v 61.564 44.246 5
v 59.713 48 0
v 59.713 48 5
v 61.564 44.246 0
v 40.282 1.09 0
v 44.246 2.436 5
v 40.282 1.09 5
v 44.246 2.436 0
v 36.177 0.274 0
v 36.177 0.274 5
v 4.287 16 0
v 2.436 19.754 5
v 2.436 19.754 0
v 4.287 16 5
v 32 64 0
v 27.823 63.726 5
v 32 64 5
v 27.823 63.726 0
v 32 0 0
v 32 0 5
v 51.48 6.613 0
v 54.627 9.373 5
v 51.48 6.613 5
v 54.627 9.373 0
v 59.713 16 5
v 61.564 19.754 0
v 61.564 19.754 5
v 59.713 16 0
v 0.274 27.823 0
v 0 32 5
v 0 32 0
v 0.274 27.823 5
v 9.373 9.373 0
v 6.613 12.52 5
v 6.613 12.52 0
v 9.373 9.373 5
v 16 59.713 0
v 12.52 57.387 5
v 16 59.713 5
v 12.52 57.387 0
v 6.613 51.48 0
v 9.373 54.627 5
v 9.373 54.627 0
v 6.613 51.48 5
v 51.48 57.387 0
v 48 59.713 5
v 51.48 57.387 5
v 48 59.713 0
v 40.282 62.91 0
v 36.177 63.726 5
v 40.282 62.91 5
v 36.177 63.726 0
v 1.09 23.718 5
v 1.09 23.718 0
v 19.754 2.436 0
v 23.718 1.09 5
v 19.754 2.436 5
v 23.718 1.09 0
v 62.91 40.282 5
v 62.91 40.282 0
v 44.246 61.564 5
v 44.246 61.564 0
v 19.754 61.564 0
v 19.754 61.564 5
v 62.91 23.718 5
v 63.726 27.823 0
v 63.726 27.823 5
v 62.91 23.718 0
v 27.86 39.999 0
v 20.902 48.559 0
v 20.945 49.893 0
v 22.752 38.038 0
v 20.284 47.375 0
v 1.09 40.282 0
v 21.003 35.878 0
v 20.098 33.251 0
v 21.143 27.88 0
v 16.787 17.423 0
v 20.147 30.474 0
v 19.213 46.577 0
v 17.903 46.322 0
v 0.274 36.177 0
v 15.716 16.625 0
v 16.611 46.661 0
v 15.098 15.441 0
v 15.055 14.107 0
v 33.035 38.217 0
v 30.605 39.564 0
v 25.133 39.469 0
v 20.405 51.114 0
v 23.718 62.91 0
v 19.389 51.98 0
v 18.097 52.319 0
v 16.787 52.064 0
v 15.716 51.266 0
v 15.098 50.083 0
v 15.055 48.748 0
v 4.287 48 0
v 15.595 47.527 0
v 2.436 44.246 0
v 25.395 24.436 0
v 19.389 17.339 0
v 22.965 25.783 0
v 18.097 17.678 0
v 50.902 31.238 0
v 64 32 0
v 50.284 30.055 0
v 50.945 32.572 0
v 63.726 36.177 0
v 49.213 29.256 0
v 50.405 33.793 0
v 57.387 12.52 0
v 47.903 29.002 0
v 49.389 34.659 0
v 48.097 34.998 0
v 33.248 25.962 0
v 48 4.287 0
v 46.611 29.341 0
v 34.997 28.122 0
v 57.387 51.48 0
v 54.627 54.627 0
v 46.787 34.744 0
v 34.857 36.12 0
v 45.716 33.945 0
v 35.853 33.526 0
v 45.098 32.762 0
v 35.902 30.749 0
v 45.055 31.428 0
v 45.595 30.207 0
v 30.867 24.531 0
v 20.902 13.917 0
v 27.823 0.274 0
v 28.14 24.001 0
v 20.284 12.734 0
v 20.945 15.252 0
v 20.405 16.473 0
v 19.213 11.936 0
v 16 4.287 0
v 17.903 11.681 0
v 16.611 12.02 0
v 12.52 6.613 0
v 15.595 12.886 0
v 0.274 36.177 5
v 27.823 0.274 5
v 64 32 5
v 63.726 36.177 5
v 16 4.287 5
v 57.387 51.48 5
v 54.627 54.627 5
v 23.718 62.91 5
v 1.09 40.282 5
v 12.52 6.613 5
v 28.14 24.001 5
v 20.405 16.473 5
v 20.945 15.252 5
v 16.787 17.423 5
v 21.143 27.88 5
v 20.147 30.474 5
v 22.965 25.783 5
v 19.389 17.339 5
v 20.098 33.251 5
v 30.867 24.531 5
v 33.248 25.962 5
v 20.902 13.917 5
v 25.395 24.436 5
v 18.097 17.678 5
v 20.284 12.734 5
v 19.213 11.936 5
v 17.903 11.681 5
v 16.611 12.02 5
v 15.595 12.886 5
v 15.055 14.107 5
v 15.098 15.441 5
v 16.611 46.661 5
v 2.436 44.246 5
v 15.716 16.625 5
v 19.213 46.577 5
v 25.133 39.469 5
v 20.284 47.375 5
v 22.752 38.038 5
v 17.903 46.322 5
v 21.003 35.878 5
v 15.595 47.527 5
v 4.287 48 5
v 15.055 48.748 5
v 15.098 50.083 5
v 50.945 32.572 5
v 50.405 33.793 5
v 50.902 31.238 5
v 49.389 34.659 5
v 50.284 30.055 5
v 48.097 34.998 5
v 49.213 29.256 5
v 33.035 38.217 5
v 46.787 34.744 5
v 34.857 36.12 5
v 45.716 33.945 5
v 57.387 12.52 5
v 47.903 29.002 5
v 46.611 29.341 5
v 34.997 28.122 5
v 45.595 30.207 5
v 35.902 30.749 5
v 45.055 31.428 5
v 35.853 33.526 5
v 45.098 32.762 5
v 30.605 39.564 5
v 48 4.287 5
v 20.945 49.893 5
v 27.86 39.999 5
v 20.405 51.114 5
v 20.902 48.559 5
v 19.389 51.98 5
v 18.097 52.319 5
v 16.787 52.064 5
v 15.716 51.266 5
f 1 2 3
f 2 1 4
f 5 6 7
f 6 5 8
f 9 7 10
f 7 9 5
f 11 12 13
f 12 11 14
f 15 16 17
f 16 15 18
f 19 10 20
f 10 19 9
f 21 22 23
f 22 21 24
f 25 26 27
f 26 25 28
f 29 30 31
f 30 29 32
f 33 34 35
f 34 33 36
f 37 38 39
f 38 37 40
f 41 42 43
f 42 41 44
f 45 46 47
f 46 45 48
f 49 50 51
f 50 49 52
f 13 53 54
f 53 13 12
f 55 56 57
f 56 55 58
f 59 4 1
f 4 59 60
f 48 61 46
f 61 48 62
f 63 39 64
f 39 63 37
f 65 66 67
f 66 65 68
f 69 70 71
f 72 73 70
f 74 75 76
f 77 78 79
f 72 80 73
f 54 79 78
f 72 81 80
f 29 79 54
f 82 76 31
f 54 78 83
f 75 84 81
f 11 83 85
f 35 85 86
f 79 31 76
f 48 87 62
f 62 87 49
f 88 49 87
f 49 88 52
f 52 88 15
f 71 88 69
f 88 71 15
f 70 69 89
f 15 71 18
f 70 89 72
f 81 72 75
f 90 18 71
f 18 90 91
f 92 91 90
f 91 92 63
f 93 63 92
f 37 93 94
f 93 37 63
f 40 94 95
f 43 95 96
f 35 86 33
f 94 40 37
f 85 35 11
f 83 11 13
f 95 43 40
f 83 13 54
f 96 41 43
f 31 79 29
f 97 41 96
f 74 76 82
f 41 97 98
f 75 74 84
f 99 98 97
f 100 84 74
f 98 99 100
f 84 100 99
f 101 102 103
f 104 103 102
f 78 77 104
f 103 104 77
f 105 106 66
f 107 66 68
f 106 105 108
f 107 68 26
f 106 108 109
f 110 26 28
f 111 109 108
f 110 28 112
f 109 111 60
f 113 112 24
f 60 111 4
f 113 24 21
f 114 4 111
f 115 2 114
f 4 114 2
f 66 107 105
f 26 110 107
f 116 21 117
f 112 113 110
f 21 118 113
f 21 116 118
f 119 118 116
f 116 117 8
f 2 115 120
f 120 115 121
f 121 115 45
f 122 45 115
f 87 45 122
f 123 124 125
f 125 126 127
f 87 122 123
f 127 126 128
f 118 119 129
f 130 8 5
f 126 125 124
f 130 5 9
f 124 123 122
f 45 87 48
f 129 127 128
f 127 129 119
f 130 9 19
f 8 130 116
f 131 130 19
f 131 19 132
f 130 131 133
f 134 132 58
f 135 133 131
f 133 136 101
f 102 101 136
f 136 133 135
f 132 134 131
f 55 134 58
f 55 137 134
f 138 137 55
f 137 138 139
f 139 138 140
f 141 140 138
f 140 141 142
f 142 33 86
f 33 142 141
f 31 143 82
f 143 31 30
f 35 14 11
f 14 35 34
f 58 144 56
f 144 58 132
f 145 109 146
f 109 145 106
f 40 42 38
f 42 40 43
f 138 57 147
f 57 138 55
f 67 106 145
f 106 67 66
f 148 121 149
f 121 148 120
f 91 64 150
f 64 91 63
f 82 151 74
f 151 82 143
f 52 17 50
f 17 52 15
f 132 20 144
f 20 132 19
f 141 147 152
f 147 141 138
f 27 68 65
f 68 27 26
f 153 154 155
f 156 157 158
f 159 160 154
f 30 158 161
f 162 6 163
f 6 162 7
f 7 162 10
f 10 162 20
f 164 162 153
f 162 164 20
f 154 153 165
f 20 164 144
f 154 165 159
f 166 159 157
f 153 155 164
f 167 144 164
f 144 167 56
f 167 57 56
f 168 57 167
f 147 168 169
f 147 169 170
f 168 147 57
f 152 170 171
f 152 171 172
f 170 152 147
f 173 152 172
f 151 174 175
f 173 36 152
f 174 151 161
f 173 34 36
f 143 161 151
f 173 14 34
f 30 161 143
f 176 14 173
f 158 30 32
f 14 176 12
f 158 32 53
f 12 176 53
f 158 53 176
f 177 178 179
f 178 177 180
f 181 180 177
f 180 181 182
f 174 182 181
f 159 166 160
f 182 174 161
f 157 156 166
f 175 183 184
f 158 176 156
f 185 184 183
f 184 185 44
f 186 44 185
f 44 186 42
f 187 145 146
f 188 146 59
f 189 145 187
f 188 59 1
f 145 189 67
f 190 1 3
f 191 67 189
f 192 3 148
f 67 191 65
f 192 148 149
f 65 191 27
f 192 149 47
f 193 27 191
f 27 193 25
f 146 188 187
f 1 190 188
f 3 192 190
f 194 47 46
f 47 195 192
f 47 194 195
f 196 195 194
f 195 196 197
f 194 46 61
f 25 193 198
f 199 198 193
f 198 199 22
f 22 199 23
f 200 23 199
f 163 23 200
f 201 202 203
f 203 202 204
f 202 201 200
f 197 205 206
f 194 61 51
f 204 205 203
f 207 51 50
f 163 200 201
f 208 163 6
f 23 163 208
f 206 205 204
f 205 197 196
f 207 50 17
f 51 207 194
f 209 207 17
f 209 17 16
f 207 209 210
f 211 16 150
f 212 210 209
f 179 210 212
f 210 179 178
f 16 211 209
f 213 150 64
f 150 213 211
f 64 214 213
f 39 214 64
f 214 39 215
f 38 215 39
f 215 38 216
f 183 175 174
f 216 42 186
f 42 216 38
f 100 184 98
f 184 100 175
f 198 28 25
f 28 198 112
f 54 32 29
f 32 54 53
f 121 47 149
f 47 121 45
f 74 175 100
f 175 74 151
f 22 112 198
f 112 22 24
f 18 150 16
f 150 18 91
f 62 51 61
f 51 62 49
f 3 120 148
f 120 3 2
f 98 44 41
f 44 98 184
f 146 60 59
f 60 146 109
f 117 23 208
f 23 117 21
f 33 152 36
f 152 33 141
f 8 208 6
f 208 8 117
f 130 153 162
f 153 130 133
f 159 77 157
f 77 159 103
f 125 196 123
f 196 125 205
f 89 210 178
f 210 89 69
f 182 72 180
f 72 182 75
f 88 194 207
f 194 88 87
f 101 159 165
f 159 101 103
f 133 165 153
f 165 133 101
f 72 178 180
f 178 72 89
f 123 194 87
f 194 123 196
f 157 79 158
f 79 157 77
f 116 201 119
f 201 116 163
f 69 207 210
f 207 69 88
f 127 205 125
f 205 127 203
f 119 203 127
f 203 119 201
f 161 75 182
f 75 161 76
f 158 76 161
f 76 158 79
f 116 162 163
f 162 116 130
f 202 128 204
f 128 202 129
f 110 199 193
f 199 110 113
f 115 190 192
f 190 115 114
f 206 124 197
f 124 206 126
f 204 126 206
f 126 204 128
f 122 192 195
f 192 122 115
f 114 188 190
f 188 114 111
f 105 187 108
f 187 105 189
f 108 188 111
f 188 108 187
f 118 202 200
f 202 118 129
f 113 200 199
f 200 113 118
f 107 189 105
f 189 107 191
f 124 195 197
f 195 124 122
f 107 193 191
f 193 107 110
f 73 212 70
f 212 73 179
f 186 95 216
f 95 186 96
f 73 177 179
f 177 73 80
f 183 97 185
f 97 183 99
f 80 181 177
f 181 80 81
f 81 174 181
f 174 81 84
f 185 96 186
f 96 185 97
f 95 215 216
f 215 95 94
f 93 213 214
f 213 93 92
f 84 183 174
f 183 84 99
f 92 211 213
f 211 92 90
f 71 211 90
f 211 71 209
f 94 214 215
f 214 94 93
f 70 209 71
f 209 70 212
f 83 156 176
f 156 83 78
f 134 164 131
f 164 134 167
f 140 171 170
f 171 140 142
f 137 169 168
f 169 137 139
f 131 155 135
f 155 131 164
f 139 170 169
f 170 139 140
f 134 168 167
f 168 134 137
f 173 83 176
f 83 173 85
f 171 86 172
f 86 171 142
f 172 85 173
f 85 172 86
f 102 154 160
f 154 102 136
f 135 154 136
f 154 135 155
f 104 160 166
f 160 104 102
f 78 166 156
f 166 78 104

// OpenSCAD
$fn = 32;

// ----------------------------------------------------------------------
// Cam plate: eccentric cam, base R32
// ----------------------------------------------------------------------

// --- parameters (mm) ---
base_r = 32;              // base circle radius
lobe_h = 10;              // cam lobe rise
bore_r = 8;               // shaft bore radius
plate_t = 5;              // plate thickness, Z (extrusion height)
ecc = 4;                  // disc eccentricity
ring_r = 20;              // lightening ring radius
bolt_r = 3;               // lightening hole radius

profile = [[64, 32], [63.726, 36.177], [62.91, 40.282], [61.564, 44.246], [59.713, 48], [57.387, 51.48], [54.627, 54.627], [51.48, 57.387], [48, 59.713], [44.246, 61.564], [40.282, 62.91], [36.177, 63.726], [32, 64], [27.823, 63.726], [23.718, 62.91], [19.754, 61.564], [16, 59.713], [12.52, 57.387], [9.373, 54.627], [6.613, 51.48], [4.287, 48], [2.436, 44.246], [1.09, 40.282], [0.274, 36.177], [0, 32], [0.274, 27.823], [1.09, 23.718], [2.436, 19.754], [4.287, 16], [6.613, 12.52], [9.373, 9.373], [12.52, 6.613], [16, 4.287], [19.754, 2.436], [23.718, 1.09], [27.823, 0.274], [32, 0], [36.177, 0.274], [40.282, 1.09], [44.246, 2.436], [48, 4.287], [51.48, 6.613], [54.627, 9.373], [57.387, 12.52], [59.713, 16], [61.564, 19.754], [62.91, 23.718], [63.726, 27.823]];  // primary outline, 48 points, counter clockwise
void_1 = [[35.853, 33.526], [34.857, 36.12], [33.035, 38.217], [30.605, 39.564], [27.86, 39.999], [25.133, 39.469], [22.752, 38.038], [21.003, 35.878], [20.098, 33.251], [20.147, 30.474], [21.143, 27.88], [22.965, 25.783], [25.395, 24.436], [28.14, 24.001], [30.867, 24.531], [33.248, 25.962], [34.997, 28.122], [35.902, 30.749]];  // shaft bore, 18 points
void_2 = [[50.945, 32.572], [50.405, 33.793], [49.389, 34.659], [48.097, 34.998], [46.787, 34.744], [45.716, 33.945], [45.098, 32.762], [45.055, 31.428], [45.595, 30.207], [46.611, 29.341], [47.903, 29.002], [49.213, 29.256], [50.284, 30.055], [50.902, 31.238]];  // lightening hole 1, 14 points
void_3 = [[20.945, 49.893], [20.405, 51.114], [19.389, 51.98], [18.097, 52.319], [16.787, 52.064], [15.716, 51.266], [15.098, 50.083], [15.055, 48.748], [15.595, 47.527], [16.611, 46.661], [17.903, 46.322], [19.213, 46.577], [20.284, 47.375], [20.902, 48.559]];  // lightening hole 2, 14 points
void_4 = [[20.945, 15.252], [20.405, 16.473], [19.389, 17.339], [18.097, 17.678], [16.787, 17.423], [15.716, 16.625], [15.098, 15.441], [15.055, 14.107], [15.595, 12.886], [16.611, 12.02], [17.903, 11.681], [19.213, 11.936], [20.284, 12.734], [20.902, 13.917]];  // lightening hole 3, 14 points

// --- the one profile operation ---
difference() {
  linear_extrude(height = plate_t) polygon(points = profile);
  translate([0, 0, -1])
    linear_extrude(height = plate_t + 2) polygon(points = void_1);
  translate([0, 0, -1])
    linear_extrude(height = plate_t + 2) polygon(points = void_2);
  translate([0, 0, -1])
    linear_extrude(height = plate_t + 2) polygon(points = void_3);
  translate([0, 0, -1])
    linear_extrude(height = plate_t + 2) polygon(points = void_4);
}
